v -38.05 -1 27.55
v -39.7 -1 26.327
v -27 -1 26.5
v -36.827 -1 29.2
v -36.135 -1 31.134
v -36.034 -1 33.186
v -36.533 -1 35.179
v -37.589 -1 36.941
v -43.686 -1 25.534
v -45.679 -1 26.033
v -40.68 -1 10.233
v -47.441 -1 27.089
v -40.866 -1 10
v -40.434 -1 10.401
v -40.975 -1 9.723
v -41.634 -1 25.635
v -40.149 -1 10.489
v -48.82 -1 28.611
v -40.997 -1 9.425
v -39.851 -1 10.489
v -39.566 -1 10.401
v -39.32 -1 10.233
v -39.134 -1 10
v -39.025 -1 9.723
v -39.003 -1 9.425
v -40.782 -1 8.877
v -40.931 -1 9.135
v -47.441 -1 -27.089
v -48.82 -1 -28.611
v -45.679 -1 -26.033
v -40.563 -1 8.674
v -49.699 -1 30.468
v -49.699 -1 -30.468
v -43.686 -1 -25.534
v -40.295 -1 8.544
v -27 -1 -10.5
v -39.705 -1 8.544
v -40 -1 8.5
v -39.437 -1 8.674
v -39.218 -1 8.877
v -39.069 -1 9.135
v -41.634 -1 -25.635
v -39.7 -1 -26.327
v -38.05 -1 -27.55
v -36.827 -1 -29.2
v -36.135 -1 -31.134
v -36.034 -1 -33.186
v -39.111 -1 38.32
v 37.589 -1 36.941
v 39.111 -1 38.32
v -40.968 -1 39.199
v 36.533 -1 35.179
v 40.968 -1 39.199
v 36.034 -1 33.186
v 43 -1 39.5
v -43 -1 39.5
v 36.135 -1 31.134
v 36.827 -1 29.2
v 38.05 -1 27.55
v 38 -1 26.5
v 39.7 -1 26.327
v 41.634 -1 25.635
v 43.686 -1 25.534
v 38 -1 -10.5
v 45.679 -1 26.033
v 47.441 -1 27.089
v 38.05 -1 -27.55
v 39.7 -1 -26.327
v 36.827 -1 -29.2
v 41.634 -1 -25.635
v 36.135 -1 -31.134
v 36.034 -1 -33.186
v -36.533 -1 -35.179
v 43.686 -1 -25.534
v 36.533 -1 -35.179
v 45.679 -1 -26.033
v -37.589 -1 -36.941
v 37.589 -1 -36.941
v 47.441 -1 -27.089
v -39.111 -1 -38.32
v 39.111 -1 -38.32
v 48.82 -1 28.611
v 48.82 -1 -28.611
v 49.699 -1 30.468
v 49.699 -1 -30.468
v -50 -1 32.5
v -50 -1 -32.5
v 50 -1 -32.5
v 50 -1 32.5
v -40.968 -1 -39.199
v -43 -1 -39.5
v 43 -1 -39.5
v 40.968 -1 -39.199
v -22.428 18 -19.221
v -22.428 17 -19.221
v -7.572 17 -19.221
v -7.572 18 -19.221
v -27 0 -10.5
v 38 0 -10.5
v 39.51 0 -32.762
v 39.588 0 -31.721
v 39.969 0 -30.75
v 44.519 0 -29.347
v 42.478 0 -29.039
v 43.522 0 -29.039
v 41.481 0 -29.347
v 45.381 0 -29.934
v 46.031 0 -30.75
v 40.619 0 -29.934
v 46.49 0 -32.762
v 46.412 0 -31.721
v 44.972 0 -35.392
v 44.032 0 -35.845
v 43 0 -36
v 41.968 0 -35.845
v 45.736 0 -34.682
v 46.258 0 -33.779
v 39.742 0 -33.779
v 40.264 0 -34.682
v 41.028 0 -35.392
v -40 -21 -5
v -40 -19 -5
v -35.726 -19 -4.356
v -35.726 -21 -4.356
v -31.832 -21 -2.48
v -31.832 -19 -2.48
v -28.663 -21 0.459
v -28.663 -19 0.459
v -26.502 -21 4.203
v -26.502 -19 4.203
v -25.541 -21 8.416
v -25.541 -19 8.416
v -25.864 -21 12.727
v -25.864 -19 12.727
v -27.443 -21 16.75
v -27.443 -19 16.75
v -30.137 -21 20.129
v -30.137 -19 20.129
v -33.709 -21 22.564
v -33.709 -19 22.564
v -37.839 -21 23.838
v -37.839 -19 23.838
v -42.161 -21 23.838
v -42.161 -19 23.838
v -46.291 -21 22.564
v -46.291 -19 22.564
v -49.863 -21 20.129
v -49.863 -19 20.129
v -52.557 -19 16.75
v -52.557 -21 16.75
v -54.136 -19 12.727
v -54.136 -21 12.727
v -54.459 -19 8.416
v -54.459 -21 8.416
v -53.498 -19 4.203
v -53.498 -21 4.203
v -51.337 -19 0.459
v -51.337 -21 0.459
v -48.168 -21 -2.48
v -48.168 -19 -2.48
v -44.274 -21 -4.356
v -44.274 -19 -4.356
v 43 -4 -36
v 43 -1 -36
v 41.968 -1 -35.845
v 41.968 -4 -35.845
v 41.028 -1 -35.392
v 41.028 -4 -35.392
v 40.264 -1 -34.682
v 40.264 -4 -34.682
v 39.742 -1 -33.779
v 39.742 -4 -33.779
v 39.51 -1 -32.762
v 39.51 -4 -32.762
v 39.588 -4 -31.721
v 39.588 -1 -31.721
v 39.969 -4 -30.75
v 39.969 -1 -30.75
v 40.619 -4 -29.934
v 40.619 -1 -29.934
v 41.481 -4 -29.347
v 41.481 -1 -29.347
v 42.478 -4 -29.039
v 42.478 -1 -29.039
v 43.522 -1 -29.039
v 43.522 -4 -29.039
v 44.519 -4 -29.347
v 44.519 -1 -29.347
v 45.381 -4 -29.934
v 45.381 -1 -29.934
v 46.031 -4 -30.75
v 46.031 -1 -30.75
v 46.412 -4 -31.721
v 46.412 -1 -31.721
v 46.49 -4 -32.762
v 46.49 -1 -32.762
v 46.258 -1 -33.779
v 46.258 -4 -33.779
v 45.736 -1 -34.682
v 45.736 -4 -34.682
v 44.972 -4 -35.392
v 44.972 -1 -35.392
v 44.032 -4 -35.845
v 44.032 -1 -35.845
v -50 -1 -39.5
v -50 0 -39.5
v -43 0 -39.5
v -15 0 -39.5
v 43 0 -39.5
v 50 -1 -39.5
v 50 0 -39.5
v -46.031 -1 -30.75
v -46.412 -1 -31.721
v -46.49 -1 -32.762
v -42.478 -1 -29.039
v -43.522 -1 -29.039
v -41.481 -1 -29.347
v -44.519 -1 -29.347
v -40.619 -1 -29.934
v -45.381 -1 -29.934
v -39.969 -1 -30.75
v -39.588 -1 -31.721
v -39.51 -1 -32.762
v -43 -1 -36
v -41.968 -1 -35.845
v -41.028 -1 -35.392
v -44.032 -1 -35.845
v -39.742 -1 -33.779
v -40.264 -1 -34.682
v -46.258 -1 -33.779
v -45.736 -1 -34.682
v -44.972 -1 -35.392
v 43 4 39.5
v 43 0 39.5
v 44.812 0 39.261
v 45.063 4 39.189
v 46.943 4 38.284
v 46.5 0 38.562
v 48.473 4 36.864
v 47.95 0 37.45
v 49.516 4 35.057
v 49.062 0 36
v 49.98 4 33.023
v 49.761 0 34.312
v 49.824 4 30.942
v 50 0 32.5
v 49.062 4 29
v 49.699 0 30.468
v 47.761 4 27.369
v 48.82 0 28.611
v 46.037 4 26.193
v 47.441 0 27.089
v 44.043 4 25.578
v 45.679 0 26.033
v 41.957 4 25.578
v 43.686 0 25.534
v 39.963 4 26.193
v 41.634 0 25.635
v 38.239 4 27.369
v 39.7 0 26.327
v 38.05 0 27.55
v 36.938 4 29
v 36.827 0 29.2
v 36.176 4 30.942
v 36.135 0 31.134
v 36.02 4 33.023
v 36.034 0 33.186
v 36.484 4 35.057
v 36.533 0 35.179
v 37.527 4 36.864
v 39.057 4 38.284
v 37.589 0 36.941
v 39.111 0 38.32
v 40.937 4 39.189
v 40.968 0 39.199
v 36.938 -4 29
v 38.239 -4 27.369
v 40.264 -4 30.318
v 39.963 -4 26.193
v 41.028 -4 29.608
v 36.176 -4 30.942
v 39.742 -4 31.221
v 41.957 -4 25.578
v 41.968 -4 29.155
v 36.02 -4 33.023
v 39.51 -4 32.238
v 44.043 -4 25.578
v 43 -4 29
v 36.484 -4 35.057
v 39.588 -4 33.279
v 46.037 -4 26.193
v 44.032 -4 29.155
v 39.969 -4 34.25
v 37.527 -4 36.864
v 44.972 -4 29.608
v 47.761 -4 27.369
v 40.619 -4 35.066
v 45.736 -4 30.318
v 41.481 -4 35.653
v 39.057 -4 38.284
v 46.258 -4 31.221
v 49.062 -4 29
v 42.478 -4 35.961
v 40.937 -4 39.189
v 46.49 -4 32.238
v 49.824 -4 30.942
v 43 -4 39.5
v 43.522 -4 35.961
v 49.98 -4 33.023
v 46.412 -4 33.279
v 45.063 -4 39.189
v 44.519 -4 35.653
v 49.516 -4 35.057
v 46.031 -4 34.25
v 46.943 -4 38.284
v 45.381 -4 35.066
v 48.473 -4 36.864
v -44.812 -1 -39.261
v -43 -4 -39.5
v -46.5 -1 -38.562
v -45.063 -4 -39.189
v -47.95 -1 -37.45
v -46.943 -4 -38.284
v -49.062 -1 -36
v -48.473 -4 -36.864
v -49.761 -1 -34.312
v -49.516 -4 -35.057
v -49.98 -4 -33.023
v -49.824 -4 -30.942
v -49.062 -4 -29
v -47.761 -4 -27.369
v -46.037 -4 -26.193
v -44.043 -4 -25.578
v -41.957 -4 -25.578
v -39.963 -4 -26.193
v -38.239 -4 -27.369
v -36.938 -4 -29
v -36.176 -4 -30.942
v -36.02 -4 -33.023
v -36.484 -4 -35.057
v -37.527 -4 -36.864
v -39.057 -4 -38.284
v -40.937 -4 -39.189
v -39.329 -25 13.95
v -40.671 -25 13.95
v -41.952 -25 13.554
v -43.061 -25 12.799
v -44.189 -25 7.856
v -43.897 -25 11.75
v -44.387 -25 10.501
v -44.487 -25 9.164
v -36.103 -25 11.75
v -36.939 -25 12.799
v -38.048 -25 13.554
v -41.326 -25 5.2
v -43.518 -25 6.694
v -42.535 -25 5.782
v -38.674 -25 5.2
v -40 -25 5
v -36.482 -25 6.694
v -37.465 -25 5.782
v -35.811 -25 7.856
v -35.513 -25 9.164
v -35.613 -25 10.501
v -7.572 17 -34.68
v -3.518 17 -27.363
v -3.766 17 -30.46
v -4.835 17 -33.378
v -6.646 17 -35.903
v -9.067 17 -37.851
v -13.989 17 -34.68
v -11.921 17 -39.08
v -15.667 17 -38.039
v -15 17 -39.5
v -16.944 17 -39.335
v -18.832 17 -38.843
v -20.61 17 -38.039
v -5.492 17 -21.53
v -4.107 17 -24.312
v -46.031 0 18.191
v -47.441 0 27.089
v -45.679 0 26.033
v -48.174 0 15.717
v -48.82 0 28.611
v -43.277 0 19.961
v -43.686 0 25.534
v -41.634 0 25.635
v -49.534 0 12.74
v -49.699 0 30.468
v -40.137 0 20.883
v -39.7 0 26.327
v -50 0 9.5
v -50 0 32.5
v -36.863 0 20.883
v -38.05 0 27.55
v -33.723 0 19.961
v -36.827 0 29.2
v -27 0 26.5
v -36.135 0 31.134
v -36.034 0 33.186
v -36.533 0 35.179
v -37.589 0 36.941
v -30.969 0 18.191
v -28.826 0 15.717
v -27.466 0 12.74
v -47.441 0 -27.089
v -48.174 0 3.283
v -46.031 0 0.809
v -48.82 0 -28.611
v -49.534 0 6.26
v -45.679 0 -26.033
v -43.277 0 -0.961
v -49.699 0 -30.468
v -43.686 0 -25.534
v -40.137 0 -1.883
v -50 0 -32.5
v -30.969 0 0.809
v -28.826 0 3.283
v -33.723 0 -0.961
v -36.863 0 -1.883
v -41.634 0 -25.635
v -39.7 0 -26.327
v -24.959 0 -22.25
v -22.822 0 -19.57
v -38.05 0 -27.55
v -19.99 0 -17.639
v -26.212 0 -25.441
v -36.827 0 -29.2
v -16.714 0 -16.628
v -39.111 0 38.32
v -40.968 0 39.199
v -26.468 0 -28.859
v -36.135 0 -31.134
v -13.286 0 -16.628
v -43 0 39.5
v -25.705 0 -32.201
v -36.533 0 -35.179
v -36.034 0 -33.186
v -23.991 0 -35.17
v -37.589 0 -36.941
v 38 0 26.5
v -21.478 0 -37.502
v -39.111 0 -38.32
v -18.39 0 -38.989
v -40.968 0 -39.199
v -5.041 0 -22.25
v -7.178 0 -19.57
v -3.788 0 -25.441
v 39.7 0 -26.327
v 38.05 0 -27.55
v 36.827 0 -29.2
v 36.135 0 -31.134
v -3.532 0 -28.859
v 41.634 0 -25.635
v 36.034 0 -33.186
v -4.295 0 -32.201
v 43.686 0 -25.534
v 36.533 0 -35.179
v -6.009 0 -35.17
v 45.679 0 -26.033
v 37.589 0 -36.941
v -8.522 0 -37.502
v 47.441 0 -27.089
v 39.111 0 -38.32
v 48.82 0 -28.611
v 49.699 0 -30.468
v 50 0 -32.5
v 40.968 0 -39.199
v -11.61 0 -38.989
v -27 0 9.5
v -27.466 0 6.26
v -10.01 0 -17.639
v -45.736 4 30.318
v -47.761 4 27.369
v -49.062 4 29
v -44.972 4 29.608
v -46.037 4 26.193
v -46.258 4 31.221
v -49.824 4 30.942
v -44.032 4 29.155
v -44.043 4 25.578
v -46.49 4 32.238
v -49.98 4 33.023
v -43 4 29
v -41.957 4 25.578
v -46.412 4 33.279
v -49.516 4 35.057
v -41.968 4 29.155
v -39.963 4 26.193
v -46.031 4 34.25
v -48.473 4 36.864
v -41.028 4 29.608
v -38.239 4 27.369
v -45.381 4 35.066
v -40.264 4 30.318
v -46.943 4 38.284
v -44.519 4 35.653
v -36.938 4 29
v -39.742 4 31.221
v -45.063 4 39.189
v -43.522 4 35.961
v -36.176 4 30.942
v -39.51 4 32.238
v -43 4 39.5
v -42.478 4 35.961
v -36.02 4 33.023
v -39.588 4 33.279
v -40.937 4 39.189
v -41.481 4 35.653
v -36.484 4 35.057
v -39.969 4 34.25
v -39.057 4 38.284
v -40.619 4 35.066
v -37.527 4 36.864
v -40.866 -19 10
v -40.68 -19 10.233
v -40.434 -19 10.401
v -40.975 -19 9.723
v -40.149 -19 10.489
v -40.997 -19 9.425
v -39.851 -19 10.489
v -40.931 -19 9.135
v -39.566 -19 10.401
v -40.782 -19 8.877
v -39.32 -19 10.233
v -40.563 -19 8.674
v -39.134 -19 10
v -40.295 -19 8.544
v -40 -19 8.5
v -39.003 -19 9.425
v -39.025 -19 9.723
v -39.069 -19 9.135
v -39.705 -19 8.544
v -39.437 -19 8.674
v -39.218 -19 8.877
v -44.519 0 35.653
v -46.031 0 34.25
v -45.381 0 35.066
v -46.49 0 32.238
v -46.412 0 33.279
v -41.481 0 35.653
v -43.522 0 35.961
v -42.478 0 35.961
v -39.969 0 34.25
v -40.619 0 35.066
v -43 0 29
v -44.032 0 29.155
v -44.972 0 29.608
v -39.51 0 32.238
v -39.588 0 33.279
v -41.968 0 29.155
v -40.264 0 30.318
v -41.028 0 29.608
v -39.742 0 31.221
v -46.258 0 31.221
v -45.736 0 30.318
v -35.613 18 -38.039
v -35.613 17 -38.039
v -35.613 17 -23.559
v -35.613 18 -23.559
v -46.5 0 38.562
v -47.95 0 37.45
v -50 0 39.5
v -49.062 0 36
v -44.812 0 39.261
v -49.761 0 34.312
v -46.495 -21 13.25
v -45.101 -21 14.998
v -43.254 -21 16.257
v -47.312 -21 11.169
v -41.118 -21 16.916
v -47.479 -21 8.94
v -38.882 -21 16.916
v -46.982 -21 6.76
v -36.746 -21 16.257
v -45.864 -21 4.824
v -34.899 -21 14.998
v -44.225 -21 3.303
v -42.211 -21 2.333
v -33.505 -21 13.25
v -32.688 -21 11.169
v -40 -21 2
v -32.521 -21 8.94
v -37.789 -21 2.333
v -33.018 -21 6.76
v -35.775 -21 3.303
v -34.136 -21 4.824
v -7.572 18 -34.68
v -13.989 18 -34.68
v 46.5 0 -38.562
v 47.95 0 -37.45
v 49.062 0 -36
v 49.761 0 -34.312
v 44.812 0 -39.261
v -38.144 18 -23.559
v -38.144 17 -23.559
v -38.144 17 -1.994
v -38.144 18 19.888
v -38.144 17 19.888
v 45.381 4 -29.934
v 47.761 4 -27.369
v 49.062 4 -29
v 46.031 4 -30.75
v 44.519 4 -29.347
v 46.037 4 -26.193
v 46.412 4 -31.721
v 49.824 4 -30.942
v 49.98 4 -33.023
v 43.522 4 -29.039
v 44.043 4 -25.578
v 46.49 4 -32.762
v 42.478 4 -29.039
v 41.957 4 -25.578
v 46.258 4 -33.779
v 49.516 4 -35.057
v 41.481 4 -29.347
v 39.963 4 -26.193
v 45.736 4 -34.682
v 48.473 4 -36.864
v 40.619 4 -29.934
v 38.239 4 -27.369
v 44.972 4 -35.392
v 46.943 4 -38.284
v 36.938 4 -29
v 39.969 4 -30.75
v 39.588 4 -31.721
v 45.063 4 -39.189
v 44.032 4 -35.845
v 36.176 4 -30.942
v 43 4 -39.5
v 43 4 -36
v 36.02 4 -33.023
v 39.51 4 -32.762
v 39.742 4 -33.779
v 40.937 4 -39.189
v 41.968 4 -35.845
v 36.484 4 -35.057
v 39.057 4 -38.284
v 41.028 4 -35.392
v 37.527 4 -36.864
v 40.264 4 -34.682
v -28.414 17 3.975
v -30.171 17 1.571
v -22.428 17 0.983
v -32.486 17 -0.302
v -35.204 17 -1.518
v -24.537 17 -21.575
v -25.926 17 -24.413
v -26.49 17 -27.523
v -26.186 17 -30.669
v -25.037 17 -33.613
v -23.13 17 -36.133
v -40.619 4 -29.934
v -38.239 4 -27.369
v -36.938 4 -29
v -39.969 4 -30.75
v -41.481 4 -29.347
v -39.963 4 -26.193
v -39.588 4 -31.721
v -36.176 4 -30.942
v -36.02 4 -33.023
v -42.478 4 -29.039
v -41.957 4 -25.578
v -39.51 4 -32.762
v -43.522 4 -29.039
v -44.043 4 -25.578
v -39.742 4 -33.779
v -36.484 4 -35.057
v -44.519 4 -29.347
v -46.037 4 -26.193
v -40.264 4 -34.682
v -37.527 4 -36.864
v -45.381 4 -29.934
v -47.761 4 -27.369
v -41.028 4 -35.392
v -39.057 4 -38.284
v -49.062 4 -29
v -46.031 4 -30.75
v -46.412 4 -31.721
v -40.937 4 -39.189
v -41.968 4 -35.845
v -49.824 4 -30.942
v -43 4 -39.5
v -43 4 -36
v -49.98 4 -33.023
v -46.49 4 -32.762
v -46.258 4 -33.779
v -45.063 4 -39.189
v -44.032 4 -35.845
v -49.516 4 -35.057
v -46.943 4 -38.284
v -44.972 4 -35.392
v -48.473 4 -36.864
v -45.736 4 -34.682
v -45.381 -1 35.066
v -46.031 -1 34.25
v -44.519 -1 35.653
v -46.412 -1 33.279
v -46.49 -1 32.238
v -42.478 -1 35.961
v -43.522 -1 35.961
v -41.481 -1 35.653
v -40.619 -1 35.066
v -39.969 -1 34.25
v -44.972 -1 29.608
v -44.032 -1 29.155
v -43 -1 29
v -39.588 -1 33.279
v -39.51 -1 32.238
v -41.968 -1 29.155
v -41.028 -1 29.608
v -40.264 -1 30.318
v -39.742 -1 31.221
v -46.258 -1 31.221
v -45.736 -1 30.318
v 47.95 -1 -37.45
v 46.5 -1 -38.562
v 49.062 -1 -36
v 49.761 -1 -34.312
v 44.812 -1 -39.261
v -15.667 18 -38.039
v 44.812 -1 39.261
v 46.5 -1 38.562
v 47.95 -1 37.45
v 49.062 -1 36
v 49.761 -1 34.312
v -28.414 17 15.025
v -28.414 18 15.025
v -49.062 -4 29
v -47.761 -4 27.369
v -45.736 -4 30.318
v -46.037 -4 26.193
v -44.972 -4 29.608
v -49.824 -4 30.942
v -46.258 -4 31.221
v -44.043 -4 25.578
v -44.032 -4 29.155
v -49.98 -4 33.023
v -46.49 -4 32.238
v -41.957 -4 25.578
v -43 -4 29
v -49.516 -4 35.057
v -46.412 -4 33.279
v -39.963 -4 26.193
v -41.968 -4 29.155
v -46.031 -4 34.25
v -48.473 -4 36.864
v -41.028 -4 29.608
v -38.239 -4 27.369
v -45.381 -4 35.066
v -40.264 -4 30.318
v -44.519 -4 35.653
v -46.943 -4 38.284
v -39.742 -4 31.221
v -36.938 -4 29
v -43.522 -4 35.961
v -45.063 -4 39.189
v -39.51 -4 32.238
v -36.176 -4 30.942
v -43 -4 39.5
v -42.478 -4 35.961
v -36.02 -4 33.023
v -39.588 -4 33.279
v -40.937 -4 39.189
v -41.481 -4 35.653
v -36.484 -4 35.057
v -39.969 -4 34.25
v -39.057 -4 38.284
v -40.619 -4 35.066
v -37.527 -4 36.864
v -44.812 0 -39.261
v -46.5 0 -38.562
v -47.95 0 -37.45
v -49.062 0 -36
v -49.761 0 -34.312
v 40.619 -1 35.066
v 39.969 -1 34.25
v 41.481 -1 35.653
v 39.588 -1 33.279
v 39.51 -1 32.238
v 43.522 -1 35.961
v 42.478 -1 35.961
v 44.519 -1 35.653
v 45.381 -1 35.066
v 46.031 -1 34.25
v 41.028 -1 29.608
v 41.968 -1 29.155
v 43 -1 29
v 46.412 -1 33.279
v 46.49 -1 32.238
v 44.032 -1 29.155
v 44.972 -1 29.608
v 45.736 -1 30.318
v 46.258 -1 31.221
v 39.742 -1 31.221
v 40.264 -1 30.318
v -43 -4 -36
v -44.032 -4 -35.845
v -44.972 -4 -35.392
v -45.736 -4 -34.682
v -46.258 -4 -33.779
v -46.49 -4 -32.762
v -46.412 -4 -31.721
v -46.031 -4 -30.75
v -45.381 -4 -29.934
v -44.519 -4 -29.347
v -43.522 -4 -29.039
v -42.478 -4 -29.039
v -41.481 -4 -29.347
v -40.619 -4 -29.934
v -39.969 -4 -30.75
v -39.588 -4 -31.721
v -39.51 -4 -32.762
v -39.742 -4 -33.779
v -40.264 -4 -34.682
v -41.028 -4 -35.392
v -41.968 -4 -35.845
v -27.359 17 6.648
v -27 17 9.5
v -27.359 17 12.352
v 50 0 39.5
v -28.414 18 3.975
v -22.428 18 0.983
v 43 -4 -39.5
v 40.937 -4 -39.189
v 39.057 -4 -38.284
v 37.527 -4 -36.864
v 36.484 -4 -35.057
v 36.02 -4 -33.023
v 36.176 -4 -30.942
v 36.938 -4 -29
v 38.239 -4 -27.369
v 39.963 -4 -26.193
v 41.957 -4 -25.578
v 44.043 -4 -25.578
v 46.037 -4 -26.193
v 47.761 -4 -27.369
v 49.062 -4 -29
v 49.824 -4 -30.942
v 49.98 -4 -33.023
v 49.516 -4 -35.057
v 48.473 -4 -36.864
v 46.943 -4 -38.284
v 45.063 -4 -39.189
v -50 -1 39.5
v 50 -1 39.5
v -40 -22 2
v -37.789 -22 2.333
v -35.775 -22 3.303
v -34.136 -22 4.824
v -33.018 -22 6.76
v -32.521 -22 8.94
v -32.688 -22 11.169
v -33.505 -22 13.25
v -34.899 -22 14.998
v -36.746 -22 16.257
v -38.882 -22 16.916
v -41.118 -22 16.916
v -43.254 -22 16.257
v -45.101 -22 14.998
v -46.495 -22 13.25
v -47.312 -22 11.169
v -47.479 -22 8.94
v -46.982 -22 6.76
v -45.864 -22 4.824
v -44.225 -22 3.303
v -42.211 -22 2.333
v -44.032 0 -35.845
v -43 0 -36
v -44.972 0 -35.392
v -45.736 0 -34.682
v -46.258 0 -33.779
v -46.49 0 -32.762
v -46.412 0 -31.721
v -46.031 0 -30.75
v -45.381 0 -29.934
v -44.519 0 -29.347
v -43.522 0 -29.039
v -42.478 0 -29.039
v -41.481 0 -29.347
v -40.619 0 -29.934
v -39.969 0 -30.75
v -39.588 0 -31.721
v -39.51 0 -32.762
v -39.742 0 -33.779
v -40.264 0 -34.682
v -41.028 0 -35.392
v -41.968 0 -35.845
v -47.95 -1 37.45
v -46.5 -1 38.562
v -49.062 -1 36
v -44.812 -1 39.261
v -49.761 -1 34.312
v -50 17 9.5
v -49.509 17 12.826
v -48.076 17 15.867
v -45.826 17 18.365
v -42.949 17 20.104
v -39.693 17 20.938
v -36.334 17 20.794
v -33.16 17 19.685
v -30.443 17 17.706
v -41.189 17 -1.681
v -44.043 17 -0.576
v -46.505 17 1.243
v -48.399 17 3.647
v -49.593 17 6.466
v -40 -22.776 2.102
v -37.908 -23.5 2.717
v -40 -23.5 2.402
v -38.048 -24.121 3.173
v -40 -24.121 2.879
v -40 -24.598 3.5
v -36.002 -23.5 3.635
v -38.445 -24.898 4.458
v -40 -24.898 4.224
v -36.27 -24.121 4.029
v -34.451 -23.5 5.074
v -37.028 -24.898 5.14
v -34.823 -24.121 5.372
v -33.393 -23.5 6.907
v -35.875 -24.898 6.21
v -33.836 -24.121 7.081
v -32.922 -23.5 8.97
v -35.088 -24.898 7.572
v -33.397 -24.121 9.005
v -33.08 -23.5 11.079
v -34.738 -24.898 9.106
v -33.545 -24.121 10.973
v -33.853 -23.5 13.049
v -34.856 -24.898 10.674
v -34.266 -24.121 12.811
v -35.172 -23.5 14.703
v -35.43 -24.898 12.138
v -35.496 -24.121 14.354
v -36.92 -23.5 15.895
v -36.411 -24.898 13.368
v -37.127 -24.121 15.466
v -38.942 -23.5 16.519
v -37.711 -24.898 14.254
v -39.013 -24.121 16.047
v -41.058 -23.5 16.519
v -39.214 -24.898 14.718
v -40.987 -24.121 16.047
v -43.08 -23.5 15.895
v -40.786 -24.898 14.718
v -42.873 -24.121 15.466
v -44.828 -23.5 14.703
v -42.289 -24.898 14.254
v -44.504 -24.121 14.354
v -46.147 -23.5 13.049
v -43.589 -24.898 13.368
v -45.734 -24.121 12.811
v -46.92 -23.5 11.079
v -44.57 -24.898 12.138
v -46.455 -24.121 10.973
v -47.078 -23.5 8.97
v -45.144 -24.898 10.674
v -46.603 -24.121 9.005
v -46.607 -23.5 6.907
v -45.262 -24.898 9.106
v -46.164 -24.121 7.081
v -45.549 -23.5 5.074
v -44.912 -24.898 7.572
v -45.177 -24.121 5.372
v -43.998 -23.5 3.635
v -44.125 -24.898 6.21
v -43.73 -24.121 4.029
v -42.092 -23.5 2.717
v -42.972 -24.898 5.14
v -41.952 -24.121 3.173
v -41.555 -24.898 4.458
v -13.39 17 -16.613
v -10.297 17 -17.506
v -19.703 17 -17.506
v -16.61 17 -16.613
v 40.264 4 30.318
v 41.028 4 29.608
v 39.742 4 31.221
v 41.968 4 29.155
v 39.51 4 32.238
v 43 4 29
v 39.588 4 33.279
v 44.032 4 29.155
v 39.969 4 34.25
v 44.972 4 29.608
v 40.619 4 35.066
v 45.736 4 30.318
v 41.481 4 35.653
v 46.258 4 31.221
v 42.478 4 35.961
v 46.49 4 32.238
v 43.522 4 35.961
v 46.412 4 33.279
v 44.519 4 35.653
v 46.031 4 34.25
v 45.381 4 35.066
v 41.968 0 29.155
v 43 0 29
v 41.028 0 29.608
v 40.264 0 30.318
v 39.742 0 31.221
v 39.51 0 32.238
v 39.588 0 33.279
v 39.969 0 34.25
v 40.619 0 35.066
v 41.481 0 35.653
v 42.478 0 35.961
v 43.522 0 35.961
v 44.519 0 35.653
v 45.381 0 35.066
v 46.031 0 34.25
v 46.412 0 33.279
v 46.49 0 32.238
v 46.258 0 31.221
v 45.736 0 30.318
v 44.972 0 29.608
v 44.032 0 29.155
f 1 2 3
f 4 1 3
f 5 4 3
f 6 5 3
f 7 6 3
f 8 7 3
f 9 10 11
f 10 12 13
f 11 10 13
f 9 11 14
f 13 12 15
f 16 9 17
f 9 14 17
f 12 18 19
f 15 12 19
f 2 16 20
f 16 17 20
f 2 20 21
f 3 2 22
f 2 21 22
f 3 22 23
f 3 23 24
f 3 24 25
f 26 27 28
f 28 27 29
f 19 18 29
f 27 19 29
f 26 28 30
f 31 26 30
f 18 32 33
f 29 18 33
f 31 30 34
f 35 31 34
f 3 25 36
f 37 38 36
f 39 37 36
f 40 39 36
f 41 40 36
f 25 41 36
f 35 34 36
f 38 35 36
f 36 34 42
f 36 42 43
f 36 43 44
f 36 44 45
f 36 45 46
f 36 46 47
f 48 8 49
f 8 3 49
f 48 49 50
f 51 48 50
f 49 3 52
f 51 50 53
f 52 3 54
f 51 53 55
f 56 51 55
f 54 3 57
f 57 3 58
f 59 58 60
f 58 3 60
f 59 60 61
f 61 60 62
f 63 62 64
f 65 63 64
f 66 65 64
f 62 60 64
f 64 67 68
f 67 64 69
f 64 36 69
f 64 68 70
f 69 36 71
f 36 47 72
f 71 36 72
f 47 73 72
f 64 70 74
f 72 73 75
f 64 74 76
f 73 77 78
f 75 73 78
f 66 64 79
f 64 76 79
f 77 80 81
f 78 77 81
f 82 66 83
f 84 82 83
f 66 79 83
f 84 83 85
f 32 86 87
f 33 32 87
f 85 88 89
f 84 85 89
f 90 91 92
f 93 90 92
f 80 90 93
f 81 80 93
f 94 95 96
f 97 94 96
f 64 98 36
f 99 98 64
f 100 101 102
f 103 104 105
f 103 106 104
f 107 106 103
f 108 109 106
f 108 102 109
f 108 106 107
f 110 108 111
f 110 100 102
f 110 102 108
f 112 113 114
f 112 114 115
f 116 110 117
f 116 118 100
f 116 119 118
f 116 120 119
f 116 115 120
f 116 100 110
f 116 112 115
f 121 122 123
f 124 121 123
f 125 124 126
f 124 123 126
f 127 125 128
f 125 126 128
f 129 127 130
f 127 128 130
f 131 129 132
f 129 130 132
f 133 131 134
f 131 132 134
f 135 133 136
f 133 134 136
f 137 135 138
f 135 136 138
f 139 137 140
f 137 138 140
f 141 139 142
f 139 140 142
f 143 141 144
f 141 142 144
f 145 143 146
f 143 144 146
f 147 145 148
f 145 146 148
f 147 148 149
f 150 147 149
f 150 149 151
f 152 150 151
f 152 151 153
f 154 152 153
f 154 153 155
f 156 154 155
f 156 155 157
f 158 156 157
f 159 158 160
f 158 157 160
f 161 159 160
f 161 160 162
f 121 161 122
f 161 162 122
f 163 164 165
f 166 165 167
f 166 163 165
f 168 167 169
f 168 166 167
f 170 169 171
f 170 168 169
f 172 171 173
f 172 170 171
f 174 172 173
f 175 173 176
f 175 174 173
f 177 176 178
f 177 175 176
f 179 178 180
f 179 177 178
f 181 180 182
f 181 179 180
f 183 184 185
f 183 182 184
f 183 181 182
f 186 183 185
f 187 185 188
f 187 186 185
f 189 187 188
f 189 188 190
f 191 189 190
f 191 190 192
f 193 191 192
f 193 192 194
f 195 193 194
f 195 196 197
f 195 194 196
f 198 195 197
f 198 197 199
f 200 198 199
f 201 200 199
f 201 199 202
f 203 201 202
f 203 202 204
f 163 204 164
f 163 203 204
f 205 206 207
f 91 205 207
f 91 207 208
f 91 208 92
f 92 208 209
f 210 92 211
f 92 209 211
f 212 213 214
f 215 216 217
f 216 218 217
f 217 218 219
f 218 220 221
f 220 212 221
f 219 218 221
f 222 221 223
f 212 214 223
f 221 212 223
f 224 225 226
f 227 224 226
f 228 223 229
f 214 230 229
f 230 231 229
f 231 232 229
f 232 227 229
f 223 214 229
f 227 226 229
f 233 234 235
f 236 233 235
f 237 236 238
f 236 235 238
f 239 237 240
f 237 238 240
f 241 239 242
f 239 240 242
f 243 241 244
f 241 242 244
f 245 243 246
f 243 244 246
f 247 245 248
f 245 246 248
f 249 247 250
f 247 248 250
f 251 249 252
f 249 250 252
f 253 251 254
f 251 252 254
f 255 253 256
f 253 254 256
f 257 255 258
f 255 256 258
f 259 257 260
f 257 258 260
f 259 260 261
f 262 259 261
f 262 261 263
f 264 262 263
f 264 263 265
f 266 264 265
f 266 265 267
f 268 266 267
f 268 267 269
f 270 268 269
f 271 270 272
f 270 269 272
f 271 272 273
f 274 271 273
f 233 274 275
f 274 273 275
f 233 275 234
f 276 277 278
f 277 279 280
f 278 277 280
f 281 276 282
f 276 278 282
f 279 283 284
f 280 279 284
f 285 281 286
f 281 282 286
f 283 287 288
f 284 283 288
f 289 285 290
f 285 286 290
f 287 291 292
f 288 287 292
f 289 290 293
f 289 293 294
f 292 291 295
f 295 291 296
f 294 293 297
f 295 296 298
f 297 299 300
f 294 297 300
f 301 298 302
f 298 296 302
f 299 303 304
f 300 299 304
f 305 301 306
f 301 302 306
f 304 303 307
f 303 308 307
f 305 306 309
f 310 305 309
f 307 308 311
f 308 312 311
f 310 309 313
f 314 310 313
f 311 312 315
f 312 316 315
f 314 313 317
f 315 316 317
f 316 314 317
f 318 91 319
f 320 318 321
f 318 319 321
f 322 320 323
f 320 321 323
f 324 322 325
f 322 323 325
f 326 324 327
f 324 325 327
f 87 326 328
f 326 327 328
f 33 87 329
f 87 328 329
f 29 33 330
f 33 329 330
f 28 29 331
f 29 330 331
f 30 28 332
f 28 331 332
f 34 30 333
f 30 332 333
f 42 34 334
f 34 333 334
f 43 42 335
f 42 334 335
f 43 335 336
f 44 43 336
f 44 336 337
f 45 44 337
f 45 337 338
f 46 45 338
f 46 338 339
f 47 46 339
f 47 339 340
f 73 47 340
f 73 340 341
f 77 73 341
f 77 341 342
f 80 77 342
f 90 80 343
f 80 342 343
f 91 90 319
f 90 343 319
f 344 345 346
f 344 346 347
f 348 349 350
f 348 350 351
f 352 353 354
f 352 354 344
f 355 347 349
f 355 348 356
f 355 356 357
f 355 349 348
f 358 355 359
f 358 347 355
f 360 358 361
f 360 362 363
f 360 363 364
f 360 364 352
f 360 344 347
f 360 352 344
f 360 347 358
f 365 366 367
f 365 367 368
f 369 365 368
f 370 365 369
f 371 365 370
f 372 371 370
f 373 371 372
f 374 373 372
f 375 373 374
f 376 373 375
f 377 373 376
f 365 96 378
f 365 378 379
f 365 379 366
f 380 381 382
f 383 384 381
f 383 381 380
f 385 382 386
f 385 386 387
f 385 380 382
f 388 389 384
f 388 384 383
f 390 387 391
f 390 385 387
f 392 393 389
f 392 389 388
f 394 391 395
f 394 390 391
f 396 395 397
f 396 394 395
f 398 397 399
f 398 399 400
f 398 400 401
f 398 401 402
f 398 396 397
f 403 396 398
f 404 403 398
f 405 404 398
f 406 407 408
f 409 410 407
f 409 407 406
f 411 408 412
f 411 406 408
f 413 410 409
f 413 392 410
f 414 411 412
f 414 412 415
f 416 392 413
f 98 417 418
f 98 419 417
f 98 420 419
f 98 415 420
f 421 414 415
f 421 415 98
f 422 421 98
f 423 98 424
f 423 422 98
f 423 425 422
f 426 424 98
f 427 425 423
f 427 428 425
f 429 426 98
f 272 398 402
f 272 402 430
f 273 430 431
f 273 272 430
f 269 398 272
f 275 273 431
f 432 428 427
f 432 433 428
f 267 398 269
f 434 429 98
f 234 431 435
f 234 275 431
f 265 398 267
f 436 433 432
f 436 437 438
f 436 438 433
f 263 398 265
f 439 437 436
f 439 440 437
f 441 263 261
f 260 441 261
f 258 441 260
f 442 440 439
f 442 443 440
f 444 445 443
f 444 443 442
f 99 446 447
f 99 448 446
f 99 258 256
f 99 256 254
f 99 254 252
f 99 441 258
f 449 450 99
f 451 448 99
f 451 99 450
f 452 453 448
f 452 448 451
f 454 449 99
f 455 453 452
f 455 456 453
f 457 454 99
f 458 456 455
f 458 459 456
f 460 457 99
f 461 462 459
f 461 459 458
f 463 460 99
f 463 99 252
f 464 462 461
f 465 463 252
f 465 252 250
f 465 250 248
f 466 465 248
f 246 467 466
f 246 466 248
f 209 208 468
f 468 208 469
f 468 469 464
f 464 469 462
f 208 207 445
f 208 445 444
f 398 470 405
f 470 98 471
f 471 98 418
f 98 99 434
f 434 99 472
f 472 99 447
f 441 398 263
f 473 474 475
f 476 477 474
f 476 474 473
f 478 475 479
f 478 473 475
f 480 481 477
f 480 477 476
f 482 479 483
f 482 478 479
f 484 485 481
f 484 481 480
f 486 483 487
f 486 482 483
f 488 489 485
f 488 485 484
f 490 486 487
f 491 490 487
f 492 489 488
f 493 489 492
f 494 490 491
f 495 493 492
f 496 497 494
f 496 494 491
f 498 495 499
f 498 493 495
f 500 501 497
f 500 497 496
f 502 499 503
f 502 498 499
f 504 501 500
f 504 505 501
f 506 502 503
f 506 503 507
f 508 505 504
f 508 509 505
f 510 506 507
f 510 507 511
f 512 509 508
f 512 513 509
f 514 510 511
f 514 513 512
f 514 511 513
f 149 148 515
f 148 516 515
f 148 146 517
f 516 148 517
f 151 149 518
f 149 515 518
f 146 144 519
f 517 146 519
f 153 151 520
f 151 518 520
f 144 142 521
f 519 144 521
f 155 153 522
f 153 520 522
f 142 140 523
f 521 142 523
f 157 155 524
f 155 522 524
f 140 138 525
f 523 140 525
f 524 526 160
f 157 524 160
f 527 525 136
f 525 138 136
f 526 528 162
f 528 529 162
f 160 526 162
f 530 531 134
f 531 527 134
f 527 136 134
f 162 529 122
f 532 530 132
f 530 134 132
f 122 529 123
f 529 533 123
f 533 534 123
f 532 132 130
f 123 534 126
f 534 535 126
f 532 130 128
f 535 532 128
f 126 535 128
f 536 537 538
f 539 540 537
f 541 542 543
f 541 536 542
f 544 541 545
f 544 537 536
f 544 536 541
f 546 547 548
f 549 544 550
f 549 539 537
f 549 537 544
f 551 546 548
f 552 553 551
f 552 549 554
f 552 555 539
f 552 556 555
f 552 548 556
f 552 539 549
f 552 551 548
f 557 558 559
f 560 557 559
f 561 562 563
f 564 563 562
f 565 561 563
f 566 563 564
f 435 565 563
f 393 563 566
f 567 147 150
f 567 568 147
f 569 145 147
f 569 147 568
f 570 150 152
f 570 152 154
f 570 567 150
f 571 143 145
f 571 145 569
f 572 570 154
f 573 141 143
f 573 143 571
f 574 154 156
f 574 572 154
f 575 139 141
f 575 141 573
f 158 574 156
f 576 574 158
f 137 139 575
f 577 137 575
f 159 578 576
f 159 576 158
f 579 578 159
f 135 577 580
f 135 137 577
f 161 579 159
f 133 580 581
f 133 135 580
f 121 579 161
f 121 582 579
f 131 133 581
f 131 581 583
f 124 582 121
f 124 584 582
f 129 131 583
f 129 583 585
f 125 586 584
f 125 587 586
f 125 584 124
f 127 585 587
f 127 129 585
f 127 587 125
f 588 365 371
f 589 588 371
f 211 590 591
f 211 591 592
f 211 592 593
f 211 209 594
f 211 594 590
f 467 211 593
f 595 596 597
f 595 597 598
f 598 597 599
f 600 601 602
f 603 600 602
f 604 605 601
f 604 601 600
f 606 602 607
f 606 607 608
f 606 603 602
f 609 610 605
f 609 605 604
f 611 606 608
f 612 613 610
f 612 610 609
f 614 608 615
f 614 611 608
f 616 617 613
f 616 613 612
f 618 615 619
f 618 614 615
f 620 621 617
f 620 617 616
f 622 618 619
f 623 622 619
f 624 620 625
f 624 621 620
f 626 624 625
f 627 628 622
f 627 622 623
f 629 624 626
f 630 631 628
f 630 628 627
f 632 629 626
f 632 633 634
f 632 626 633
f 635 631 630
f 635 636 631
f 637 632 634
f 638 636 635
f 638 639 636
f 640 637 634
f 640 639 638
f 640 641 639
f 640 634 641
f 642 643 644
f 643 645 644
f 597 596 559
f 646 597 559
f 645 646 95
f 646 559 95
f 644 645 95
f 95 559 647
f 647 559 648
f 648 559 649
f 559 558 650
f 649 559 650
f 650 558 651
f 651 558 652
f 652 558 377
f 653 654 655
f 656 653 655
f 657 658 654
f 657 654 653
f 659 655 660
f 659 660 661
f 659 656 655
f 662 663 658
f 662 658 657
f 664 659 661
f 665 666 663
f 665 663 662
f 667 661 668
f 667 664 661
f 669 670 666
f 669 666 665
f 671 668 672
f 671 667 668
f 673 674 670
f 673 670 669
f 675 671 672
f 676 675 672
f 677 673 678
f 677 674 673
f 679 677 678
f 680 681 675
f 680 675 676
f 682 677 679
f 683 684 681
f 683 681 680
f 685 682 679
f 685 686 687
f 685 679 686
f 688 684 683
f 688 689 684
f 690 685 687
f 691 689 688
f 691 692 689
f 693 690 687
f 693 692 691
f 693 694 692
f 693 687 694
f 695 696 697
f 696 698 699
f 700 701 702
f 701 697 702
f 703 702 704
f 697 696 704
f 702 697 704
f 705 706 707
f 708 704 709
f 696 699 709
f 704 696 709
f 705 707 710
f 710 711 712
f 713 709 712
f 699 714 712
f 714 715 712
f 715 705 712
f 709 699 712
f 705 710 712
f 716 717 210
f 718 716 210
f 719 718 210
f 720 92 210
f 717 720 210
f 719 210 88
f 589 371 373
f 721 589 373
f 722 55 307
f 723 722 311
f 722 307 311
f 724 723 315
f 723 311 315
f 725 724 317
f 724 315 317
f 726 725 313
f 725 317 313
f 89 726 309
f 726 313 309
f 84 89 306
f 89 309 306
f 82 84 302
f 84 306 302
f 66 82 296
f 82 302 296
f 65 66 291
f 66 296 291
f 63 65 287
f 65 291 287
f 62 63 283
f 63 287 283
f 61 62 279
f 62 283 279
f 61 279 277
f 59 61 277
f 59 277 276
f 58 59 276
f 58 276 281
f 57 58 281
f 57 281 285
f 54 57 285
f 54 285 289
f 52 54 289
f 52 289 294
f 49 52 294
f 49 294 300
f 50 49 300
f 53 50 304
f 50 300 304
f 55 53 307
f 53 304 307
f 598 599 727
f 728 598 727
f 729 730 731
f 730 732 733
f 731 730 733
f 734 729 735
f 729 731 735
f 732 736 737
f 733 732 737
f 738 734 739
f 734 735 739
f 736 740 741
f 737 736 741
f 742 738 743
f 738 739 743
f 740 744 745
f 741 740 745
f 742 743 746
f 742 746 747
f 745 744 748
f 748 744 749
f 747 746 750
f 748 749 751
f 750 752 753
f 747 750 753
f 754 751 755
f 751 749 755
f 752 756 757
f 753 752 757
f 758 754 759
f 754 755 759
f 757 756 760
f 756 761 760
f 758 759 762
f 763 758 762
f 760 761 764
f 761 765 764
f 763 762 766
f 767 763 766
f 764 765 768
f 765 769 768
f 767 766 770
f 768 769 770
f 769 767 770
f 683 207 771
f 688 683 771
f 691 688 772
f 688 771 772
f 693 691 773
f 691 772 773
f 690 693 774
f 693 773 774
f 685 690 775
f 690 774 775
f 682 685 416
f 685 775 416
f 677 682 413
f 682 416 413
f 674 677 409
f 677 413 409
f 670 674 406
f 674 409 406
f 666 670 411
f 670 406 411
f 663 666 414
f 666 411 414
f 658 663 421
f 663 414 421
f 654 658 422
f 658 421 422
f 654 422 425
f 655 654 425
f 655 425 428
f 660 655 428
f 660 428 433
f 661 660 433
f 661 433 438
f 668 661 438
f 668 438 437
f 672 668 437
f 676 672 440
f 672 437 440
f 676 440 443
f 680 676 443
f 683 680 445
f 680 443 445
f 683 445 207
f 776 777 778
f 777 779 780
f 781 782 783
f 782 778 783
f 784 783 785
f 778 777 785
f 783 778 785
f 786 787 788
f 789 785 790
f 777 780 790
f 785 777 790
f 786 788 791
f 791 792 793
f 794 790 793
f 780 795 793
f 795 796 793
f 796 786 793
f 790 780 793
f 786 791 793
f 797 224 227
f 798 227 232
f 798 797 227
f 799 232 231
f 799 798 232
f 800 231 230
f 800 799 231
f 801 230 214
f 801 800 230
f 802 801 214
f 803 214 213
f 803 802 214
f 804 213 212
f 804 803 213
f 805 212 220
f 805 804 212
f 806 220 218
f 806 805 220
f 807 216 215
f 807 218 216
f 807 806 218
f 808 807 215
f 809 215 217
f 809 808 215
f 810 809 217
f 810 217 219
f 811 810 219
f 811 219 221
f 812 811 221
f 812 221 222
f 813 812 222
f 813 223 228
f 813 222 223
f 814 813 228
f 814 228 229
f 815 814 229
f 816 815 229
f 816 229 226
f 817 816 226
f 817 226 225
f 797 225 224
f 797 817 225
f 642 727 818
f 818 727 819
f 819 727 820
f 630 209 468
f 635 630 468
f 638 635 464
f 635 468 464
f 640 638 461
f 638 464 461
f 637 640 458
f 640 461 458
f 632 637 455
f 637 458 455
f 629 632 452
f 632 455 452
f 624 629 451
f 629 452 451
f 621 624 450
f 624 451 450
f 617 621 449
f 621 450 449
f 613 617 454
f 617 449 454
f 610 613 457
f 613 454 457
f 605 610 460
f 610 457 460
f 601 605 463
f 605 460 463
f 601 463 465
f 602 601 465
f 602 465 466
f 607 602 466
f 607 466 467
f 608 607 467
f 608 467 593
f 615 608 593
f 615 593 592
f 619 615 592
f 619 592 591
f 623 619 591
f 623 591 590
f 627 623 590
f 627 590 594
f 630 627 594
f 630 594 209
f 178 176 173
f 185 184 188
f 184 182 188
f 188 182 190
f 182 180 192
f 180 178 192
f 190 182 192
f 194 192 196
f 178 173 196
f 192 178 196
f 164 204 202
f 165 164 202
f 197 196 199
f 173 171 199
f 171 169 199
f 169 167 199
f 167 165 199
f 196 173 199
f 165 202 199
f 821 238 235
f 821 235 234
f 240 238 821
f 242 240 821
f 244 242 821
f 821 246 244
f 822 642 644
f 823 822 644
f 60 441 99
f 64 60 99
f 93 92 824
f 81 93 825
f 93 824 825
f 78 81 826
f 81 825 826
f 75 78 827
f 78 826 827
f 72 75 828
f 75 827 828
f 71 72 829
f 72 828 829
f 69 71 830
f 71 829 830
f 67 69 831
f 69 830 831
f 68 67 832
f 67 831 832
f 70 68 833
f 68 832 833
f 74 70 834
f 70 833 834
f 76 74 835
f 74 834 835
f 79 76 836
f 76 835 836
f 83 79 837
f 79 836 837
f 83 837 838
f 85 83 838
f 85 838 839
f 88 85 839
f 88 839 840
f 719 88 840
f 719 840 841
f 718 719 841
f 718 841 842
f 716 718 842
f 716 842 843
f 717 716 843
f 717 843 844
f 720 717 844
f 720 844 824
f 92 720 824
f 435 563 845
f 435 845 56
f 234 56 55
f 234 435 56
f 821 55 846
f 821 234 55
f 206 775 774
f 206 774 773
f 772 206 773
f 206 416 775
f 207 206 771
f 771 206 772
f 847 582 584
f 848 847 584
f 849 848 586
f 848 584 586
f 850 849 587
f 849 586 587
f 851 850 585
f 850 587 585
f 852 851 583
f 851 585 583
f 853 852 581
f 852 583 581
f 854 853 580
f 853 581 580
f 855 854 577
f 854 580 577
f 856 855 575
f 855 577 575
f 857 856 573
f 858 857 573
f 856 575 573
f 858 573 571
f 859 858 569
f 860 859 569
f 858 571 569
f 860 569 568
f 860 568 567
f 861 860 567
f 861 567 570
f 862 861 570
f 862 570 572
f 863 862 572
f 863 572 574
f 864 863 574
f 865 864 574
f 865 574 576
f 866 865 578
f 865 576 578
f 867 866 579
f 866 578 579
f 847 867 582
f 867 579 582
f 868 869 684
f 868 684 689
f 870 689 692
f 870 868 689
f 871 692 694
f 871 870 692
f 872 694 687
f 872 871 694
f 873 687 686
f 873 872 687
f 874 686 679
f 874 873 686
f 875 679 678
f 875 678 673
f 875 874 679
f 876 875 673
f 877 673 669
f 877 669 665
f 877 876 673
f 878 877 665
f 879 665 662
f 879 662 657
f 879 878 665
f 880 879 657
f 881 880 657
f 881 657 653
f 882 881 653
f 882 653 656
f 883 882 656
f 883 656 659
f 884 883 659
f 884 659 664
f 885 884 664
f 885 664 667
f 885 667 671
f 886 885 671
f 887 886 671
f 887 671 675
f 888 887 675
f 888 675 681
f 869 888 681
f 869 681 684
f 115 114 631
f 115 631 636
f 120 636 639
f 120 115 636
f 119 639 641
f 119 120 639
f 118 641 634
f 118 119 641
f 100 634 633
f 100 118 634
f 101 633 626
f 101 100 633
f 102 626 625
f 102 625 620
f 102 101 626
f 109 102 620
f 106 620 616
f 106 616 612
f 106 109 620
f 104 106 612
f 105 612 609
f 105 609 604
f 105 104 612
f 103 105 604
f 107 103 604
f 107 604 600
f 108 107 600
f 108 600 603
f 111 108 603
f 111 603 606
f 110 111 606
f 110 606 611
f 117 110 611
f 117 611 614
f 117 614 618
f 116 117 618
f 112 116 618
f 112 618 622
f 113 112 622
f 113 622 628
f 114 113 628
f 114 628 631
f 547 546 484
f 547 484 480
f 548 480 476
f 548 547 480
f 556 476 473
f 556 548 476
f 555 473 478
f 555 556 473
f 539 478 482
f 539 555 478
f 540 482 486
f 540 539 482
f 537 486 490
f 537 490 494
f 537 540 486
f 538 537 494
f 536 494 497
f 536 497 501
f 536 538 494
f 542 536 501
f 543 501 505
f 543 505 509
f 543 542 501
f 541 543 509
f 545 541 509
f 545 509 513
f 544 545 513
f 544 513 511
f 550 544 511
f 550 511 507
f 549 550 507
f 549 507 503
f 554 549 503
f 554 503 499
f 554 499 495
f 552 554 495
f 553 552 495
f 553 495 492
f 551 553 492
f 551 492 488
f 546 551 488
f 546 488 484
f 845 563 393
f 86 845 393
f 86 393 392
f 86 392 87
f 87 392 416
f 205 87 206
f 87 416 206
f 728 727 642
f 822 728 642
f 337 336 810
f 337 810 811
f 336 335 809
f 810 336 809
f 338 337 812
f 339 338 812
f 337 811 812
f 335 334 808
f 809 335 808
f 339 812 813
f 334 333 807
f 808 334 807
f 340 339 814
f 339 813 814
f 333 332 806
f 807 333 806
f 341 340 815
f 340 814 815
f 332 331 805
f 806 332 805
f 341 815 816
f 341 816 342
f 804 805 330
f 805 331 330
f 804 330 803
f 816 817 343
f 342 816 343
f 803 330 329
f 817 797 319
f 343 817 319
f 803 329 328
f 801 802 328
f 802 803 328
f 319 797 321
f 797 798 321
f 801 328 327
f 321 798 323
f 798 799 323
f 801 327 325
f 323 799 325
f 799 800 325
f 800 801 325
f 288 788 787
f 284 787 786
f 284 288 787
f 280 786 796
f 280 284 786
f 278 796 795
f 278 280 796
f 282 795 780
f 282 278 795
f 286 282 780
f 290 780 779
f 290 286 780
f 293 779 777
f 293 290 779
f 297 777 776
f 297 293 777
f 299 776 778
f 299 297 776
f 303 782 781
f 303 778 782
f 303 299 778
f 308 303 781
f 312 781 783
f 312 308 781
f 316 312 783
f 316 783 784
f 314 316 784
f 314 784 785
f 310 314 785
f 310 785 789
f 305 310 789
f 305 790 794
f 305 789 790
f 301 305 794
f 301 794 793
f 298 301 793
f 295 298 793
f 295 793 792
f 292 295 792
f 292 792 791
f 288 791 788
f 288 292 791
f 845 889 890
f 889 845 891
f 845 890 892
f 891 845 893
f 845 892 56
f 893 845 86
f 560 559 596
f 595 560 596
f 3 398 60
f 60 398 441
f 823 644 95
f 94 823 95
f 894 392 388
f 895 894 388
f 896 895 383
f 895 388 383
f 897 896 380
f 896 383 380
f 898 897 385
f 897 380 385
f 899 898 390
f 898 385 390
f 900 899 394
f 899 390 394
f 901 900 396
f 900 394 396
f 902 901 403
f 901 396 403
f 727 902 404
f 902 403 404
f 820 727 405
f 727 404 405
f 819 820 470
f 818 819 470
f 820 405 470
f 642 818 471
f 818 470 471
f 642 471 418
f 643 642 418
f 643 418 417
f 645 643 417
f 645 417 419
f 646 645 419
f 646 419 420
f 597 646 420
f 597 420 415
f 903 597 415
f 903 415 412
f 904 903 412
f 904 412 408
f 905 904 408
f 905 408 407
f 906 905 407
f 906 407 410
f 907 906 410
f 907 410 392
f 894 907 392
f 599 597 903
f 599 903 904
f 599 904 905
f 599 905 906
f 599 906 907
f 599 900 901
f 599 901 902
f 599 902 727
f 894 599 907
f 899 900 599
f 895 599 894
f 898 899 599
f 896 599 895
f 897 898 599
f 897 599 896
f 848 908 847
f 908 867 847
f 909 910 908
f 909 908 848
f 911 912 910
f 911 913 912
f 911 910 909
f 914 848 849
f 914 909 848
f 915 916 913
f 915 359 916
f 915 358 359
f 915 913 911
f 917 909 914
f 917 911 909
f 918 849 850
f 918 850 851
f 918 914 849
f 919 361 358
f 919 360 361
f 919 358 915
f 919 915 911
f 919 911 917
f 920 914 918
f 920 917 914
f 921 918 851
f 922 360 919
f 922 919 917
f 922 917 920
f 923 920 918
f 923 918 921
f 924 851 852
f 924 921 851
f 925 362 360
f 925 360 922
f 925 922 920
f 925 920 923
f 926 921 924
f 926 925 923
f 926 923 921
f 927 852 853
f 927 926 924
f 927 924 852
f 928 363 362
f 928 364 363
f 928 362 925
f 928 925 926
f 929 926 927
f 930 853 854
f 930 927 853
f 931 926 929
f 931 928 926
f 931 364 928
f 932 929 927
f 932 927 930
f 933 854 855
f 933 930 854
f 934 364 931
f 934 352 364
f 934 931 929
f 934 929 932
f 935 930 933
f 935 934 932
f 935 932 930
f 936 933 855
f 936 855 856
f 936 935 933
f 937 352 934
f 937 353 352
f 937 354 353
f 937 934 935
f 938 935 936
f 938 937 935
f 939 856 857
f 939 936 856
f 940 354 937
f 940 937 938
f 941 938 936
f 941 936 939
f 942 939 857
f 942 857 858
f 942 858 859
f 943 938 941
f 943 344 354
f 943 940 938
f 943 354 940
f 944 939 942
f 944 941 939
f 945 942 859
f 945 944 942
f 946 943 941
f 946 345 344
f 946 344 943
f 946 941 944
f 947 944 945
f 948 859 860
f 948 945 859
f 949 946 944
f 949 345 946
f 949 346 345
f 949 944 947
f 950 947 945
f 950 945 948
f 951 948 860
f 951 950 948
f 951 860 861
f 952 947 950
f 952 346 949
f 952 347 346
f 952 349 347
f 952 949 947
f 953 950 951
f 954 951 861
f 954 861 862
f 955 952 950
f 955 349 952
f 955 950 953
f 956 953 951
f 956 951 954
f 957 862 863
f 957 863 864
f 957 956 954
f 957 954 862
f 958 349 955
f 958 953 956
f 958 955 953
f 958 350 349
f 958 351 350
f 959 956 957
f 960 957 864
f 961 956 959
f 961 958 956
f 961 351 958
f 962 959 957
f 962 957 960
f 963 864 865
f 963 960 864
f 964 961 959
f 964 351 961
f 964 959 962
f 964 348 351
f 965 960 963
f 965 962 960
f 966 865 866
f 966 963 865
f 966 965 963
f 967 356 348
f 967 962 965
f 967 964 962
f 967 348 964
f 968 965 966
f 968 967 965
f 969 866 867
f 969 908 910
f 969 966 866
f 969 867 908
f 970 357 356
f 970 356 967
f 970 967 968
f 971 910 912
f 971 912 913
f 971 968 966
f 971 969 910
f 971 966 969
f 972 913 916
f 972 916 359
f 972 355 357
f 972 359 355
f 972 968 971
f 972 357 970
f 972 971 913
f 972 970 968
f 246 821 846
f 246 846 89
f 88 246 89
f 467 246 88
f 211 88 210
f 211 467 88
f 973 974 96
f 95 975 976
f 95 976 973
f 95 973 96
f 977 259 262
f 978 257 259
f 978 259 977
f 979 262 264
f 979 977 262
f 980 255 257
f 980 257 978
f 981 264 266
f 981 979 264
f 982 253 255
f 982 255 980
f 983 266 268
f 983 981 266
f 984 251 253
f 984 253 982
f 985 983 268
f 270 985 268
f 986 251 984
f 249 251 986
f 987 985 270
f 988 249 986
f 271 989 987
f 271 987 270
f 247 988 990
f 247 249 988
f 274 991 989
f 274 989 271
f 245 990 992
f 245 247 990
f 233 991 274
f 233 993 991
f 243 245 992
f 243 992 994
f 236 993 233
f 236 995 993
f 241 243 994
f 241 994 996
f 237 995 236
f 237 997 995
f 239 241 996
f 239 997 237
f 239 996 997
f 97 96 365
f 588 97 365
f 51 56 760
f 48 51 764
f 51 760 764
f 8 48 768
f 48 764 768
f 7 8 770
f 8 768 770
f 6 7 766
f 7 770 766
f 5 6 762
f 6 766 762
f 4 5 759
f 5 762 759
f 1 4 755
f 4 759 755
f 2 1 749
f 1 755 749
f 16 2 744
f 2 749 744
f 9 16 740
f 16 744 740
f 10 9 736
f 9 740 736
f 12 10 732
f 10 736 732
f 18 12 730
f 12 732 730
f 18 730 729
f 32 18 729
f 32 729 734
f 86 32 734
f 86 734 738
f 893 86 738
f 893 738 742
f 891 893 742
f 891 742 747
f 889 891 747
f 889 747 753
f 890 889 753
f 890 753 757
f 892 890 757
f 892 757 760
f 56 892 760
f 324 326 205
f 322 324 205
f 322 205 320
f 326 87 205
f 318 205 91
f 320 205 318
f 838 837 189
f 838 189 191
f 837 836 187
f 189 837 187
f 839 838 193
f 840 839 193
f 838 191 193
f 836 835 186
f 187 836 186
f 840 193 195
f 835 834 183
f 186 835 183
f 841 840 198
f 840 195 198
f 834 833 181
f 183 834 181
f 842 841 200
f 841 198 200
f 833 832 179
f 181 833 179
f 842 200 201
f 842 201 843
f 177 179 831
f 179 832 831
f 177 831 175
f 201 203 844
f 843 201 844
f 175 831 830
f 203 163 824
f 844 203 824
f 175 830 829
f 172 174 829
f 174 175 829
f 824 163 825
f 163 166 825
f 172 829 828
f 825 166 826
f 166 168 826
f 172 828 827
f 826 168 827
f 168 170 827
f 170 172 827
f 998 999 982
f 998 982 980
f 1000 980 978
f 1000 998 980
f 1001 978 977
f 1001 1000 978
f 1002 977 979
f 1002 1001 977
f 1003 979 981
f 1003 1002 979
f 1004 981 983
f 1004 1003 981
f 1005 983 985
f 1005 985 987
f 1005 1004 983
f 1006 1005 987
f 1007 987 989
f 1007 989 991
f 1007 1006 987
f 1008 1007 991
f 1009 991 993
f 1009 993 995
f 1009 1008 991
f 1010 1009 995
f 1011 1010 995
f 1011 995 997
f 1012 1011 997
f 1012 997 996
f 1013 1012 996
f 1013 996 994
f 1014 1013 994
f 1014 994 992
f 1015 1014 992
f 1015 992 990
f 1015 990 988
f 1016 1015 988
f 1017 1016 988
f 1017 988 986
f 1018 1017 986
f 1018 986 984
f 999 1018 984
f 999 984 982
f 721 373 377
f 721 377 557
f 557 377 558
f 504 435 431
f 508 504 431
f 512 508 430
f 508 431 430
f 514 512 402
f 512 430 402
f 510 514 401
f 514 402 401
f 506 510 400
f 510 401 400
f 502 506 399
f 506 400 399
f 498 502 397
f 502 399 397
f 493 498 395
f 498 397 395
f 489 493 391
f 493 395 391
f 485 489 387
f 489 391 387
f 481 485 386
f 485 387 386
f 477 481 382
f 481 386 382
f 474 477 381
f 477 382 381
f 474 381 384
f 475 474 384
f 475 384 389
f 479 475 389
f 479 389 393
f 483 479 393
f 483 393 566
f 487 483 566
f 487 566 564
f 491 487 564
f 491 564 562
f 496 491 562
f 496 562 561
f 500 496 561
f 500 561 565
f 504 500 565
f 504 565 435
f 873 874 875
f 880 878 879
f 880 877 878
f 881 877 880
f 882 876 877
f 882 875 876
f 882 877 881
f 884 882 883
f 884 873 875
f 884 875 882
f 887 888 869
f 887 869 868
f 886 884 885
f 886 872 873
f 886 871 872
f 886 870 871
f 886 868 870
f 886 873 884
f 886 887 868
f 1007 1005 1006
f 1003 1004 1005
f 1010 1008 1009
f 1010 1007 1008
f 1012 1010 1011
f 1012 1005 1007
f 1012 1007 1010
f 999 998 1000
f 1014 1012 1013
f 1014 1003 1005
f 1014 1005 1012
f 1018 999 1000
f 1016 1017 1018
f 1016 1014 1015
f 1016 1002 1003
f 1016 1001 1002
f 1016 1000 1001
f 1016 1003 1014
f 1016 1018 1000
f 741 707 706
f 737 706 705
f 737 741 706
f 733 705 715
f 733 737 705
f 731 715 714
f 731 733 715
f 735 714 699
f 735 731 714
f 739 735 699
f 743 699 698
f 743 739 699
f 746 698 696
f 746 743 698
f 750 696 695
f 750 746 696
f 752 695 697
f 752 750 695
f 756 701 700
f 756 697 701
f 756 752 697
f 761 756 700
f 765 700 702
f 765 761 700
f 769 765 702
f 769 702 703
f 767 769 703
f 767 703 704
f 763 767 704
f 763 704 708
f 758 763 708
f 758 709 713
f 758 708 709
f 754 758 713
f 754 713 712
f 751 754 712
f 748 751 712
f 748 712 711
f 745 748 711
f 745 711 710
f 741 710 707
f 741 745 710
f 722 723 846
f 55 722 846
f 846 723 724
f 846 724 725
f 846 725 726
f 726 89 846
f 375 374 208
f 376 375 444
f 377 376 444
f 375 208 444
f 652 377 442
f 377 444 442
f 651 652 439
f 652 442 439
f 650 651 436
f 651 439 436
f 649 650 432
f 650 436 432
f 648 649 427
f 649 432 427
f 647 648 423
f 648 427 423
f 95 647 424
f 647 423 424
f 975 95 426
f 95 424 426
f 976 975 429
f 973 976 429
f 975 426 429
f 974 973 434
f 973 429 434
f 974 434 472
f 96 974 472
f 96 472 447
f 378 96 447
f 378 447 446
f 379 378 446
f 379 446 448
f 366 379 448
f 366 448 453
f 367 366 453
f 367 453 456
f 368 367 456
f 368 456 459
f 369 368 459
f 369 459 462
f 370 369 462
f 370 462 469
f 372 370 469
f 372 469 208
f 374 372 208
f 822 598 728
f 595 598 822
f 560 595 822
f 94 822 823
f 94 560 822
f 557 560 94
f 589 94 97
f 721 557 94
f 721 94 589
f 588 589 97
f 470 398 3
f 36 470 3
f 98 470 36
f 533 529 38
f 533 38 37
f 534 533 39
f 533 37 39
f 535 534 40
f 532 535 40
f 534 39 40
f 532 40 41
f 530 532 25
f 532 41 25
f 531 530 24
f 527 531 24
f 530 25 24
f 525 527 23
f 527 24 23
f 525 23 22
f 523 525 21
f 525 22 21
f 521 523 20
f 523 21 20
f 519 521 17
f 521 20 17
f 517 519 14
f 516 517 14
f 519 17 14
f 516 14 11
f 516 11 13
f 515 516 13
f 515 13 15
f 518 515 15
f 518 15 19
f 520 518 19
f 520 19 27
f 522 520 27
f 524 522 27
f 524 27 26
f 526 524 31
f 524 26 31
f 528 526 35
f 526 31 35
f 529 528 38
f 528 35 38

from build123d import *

# Parameters (mm, degrees)
ESQUISSE4_W             = 100
ESQUISSE4_H             = 79
BOSS_EXTRU_3_DEPTH      = 1
BOSS_EXTRU_4_DEPTH      = 4
BOSS_EXTRU_4_DEPTH_BACK = 4
ESQUISSE1_R             = 7
ESQUISSE1_R_2           = 3.5
ESQUISSE6_R             = 11.5
BOSS_EXTRU_5_DEPTH      = 17
BOSS_EXTRU_6_DEPTH      = 1
ESQUISSE8_W             = 65
ESQUISSE8_H             = 37
ENL_V_MAT_EXTRU_1_DEPTH = 1
ESQUISSE9_R             = 1
BOSS_EXTRU_7_DEPTH      = 18
ESQUISSE10_R            = 14.5
BOSS_EXTRU_8_DEPTH      = 2
ESQUISSE11_R            = 7.5
BOSS_EXTRU_9_DEPTH      = 4
CONG_1_R                = 3


with BuildPart() as part:
    # Esquisse4 → Boss.-Extru.3 (new body)
    with BuildSketch(Plane(origin=(0, 0, 0), x_dir=(1, 0, 0), z_dir=(0, 1, 0))):
        Rectangle(ESQUISSE4_W, ESQUISSE4_H)
    extrude(amount=-BOSS_EXTRU_3_DEPTH)

    # Esquisse1 → Boss.-Extru.4 (add, two sides: drawn at the far end of the back side and taken through both)
    # profile 1 of 4: a face of its own
    with BuildSketch(Plane(origin=(0, 0, 0), x_dir=(1, 0, 0), z_dir=(0, 1, 0)).offset(-BOSS_EXTRU_4_DEPTH_BACK)):
        with Locations((-43, -32.5)):
            Circle(ESQUISSE1_R)
        with Locations((-43, -32.5)):
            Circle(ESQUISSE1_R_2, mode=Mode.SUBTRACT)
    # profile 2 of 4: a face of its own
    with BuildSketch(Plane(origin=(0, 0, 0), x_dir=(1, 0, 0), z_dir=(0, 1, 0)).offset(-BOSS_EXTRU_4_DEPTH_BACK)):
        with Locations((43, -32.5)):
            Circle(ESQUISSE1_R)
        with Locations((43, -32.5)):
            Circle(ESQUISSE1_R_2, mode=Mode.SUBTRACT)
    # profile 3 of 4: a face of its own
    with BuildSketch(Plane(origin=(0, 0, 0), x_dir=(1, 0, 0), z_dir=(0, 1, 0)).offset(-BOSS_EXTRU_4_DEPTH_BACK)):
        with Locations((-43, 32.5)):
            Circle(ESQUISSE1_R)
        with Locations((-43, 32.5)):
            Circle(ESQUISSE1_R_2, mode=Mode.SUBTRACT)
    # profile 4 of 4: a face of its own
    with BuildSketch(Plane(origin=(0, 0, 0), x_dir=(1, 0, 0), z_dir=(0, 1, 0)).offset(-BOSS_EXTRU_4_DEPTH_BACK)):
        with Locations((43, 32.5)):
            Circle(ESQUISSE1_R)
        with Locations((43, 32.5)):
            Circle(ESQUISSE1_R_2, mode=Mode.SUBTRACT)
    extrude(amount=BOSS_EXTRU_4_DEPTH + BOSS_EXTRU_4_DEPTH_BACK)

    # Esquisse6 → Boss.-Extru.5 (add)
    with BuildSketch(Plane(origin=(0, 0, 0), x_dir=(1, 0, 0), z_dir=(0, 1, 0))):
        with Locations((-38.5, -9.5)):
            Circle(ESQUISSE6_R)
        with Locations((-15, 28)):
            Circle(ESQUISSE6_R)
    extrude(amount=BOSS_EXTRU_5_DEPTH)

    # Esquisse7 → Boss.-Extru.6 (add)
    with BuildSketch(Plane(origin=(0, 17, 0), x_dir=(1, 0, 0), z_dir=(0, 1, 0))):
        Polygon((-38.143774149, -19.88751618), (-28.414215556, -15.025120102), (-28.414215556, -3.974879898), (-22.428299765, -0.98338823), (-22.428299765, 19.221027247), (-7.571700235, 19.221027247), (-7.571700235, 34.680148422), (-13.988712335, 34.680148422), (-15.667356388, 38.039082045), (-35.613243864, 38.039082045), (-35.613243864, 23.559466539), (-38.143774149, 23.559466539), (-38.143774149, 0), align=None)
    extrude(amount=BOSS_EXTRU_6_DEPTH)

    # Esquisse8 → Enlèv. mat.-Extru.1 (cut)
    with BuildSketch(Plane(origin=(0, 0, 0), x_dir=(1, 0, 0), z_dir=(0, 1, 0))):
        with Locations((5.5, -8)):
            Rectangle(ESQUISSE8_W, ESQUISSE8_H)
    extrude(amount=-ENL_V_MAT_EXTRU_1_DEPTH, mode=Mode.SUBTRACT)

    # Esquisse9 → Boss.-Extru.7 (add)
    with BuildSketch(Plane.XZ.offset(1)):
        with Locations((-40, 9.5)):
            Circle(ESQUISSE9_R)
    extrude(amount=BOSS_EXTRU_7_DEPTH)

    # Esquisse10 → Boss.-Extru.8 (add)
    with BuildSketch(Plane.XZ.offset(19)):
        with Locations((-40, 9.5)):
            Circle(ESQUISSE10_R)
    extrude(amount=BOSS_EXTRU_8_DEPTH)

    # Esquisse11 → Boss.-Extru.9 (add)
    with BuildSketch(Plane(origin=(0, -21, 0), x_dir=(-1, 0, 0), z_dir=(0, -1, 0))):
        with Locations((40, -9.5)):
            Circle(ESQUISSE11_R)
    extrude(amount=BOSS_EXTRU_9_DEPTH)

    # Congé1
    cong_1_edges = [part.edges().sort_by_distance(p)[0] for p in [
        (-32.5, -25, 9.5),
    ]]
    fillet(cong_1_edges, radius=CONG_1_R)


solid = part.part
